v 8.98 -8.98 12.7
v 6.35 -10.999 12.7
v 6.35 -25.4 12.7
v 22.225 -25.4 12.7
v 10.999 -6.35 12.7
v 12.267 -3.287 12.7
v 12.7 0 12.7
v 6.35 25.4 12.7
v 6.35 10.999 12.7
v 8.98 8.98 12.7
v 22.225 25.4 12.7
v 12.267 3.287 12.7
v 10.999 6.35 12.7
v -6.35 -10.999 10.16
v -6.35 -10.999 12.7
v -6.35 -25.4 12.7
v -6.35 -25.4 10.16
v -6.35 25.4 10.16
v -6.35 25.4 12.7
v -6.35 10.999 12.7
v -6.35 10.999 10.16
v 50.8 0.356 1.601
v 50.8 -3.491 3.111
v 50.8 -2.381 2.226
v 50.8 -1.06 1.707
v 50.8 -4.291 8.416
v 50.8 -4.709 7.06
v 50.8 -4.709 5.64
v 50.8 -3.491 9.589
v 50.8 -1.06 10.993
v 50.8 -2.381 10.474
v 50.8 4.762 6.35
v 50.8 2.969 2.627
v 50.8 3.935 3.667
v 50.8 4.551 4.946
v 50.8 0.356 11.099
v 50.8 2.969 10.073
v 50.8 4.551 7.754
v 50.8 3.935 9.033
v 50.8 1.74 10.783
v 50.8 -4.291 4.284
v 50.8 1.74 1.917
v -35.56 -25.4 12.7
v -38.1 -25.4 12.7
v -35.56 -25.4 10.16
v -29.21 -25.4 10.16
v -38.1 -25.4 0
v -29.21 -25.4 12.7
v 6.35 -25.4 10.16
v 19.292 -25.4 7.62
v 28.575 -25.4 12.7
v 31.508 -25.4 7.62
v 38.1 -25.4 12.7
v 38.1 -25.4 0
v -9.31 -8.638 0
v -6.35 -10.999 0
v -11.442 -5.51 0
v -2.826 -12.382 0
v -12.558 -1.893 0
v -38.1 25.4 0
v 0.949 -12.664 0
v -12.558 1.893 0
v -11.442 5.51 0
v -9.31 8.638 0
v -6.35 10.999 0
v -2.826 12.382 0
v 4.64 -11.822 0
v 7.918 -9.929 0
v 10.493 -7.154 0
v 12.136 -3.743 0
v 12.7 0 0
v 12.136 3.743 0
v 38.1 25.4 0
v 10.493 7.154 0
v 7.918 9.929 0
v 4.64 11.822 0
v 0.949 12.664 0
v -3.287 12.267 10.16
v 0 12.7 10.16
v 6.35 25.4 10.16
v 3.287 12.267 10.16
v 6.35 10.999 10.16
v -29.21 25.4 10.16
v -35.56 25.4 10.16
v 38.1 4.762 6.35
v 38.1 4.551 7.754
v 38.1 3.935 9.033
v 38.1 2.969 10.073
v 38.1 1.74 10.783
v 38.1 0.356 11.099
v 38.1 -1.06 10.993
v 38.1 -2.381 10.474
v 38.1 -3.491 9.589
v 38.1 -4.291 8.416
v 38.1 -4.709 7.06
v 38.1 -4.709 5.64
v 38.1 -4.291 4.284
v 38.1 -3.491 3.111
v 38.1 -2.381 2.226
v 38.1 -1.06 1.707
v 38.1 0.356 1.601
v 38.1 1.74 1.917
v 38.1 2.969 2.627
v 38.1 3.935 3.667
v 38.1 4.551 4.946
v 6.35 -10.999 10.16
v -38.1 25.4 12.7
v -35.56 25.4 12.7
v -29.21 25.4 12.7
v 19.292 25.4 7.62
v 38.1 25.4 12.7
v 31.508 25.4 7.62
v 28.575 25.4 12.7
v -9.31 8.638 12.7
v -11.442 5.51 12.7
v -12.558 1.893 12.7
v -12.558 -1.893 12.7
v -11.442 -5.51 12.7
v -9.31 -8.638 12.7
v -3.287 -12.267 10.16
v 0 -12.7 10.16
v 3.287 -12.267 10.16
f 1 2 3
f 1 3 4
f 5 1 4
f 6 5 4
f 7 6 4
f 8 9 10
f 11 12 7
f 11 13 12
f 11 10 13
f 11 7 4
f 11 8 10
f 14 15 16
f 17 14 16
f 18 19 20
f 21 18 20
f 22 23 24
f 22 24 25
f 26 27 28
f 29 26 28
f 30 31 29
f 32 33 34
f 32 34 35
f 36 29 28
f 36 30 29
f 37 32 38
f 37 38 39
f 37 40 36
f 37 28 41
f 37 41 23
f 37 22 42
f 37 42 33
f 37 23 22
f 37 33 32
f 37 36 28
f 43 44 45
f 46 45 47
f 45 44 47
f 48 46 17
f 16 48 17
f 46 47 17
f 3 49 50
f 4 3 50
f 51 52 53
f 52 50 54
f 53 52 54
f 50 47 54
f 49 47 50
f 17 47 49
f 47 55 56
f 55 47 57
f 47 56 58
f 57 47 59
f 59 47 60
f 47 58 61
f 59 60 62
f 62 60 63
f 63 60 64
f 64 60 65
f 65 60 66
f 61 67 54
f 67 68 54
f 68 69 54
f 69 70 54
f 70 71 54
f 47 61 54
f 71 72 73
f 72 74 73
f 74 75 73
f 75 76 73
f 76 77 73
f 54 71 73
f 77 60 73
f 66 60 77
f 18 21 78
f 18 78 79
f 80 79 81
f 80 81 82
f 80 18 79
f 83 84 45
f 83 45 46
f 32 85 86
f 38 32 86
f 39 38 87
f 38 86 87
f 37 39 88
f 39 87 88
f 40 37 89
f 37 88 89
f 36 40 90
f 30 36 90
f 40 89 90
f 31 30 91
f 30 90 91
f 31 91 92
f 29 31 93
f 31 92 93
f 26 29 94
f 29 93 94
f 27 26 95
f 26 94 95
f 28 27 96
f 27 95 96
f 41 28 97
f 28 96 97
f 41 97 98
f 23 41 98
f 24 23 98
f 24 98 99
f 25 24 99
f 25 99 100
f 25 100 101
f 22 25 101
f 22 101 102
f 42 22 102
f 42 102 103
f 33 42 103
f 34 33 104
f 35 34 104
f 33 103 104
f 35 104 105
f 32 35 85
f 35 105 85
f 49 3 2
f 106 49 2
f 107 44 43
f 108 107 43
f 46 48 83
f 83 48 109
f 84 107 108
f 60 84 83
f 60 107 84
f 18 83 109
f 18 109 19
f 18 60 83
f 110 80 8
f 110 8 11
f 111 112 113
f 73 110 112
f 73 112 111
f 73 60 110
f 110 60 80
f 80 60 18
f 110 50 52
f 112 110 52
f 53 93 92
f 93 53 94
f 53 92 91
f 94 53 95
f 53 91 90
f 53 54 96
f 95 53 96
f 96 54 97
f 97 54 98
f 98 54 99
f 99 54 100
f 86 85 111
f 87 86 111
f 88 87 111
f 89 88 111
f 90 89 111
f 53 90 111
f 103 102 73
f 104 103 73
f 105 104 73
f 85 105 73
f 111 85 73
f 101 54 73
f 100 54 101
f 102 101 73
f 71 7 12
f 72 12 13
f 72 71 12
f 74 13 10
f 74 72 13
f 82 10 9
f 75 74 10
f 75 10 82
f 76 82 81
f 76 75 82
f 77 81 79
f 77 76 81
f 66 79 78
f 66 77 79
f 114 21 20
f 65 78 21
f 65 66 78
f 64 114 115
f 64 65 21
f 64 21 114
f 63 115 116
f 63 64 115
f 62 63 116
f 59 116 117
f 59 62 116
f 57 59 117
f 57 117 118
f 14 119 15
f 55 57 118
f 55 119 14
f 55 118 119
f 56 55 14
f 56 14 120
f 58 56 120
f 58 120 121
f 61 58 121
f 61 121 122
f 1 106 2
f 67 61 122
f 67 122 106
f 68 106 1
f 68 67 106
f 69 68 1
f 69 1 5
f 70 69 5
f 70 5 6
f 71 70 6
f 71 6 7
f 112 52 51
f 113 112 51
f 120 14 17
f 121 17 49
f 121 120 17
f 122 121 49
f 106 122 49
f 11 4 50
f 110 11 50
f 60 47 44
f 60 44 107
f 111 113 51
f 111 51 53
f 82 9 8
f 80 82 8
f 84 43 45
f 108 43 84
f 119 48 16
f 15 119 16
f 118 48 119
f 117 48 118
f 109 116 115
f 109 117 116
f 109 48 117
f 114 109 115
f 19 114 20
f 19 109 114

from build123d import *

# Parameters (mm, degrees)
F0_W     = 76.2
F0_H     = 50.8
F0_R     = 12.7
F1_DEPTH = 12.7
F2_W     = 6.35
F2_H     = 50.8
F3_DEPTH = 2.54
F5_DEPTH = 65.278
F6_R     = 4.7625
F7_DEPTH = 12.7


with BuildPart() as f1:
    # F0 (on Top) → F1 (new body)
    with BuildSketch(Plane.XY):
        Rectangle(F0_W, F0_H)
        Circle(F0_R, mode=Mode.SUBTRACT)
    extrude(amount=F1_DEPTH)

    # F2 (on face) → F3 (cut)
    with BuildSketch(Plane.XY.offset(12.7)):
        with Locations((-32.385, 0)):
            Rectangle(F2_W, F2_H)
        with BuildLine():
            Line((6.35, 25.4), (-6.35, 25.4))
            Line((-6.35, 25.4), (-6.35, 10.9985226281))
            ThreePointArc((-6.35, 10.9985226281), (0, 12.7), (6.35, 10.9985226281))
            Line((6.35, 10.9985226281), (6.35, 25.4))
        make_face()
        with BuildLine():
            Line((-6.35, -10.9985226281), (-6.35, -25.4))
            Line((-6.35, -25.4), (6.35, -25.4))
            Line((6.35, -25.4), (6.35, -10.9985226281))
            ThreePointArc((6.35, -10.9985226281), (0, -12.7), (-6.35, -10.9985226281))
        make_face()
    extrude(amount=-F3_DEPTH, mode=Mode.SUBTRACT)

    # F4 (on face) → F5 (cut)
    with BuildSketch(Plane.XZ.offset(25.4)):
        Polygon((28.575, 12.7), (22.225, 12.7), (19.2920606325, 7.62), (31.5079393675, 7.62), align=None)
    extrude(amount=-F5_DEPTH, mode=Mode.SUBTRACT)

    # F6 (on face) → F7 (join)
    with BuildSketch(Plane.YZ.offset(38.1)):
        with Locations((0, 6.35)):
            Circle(F6_R)
    extrude(amount=F7_DEPTH)


solid = f1.part
